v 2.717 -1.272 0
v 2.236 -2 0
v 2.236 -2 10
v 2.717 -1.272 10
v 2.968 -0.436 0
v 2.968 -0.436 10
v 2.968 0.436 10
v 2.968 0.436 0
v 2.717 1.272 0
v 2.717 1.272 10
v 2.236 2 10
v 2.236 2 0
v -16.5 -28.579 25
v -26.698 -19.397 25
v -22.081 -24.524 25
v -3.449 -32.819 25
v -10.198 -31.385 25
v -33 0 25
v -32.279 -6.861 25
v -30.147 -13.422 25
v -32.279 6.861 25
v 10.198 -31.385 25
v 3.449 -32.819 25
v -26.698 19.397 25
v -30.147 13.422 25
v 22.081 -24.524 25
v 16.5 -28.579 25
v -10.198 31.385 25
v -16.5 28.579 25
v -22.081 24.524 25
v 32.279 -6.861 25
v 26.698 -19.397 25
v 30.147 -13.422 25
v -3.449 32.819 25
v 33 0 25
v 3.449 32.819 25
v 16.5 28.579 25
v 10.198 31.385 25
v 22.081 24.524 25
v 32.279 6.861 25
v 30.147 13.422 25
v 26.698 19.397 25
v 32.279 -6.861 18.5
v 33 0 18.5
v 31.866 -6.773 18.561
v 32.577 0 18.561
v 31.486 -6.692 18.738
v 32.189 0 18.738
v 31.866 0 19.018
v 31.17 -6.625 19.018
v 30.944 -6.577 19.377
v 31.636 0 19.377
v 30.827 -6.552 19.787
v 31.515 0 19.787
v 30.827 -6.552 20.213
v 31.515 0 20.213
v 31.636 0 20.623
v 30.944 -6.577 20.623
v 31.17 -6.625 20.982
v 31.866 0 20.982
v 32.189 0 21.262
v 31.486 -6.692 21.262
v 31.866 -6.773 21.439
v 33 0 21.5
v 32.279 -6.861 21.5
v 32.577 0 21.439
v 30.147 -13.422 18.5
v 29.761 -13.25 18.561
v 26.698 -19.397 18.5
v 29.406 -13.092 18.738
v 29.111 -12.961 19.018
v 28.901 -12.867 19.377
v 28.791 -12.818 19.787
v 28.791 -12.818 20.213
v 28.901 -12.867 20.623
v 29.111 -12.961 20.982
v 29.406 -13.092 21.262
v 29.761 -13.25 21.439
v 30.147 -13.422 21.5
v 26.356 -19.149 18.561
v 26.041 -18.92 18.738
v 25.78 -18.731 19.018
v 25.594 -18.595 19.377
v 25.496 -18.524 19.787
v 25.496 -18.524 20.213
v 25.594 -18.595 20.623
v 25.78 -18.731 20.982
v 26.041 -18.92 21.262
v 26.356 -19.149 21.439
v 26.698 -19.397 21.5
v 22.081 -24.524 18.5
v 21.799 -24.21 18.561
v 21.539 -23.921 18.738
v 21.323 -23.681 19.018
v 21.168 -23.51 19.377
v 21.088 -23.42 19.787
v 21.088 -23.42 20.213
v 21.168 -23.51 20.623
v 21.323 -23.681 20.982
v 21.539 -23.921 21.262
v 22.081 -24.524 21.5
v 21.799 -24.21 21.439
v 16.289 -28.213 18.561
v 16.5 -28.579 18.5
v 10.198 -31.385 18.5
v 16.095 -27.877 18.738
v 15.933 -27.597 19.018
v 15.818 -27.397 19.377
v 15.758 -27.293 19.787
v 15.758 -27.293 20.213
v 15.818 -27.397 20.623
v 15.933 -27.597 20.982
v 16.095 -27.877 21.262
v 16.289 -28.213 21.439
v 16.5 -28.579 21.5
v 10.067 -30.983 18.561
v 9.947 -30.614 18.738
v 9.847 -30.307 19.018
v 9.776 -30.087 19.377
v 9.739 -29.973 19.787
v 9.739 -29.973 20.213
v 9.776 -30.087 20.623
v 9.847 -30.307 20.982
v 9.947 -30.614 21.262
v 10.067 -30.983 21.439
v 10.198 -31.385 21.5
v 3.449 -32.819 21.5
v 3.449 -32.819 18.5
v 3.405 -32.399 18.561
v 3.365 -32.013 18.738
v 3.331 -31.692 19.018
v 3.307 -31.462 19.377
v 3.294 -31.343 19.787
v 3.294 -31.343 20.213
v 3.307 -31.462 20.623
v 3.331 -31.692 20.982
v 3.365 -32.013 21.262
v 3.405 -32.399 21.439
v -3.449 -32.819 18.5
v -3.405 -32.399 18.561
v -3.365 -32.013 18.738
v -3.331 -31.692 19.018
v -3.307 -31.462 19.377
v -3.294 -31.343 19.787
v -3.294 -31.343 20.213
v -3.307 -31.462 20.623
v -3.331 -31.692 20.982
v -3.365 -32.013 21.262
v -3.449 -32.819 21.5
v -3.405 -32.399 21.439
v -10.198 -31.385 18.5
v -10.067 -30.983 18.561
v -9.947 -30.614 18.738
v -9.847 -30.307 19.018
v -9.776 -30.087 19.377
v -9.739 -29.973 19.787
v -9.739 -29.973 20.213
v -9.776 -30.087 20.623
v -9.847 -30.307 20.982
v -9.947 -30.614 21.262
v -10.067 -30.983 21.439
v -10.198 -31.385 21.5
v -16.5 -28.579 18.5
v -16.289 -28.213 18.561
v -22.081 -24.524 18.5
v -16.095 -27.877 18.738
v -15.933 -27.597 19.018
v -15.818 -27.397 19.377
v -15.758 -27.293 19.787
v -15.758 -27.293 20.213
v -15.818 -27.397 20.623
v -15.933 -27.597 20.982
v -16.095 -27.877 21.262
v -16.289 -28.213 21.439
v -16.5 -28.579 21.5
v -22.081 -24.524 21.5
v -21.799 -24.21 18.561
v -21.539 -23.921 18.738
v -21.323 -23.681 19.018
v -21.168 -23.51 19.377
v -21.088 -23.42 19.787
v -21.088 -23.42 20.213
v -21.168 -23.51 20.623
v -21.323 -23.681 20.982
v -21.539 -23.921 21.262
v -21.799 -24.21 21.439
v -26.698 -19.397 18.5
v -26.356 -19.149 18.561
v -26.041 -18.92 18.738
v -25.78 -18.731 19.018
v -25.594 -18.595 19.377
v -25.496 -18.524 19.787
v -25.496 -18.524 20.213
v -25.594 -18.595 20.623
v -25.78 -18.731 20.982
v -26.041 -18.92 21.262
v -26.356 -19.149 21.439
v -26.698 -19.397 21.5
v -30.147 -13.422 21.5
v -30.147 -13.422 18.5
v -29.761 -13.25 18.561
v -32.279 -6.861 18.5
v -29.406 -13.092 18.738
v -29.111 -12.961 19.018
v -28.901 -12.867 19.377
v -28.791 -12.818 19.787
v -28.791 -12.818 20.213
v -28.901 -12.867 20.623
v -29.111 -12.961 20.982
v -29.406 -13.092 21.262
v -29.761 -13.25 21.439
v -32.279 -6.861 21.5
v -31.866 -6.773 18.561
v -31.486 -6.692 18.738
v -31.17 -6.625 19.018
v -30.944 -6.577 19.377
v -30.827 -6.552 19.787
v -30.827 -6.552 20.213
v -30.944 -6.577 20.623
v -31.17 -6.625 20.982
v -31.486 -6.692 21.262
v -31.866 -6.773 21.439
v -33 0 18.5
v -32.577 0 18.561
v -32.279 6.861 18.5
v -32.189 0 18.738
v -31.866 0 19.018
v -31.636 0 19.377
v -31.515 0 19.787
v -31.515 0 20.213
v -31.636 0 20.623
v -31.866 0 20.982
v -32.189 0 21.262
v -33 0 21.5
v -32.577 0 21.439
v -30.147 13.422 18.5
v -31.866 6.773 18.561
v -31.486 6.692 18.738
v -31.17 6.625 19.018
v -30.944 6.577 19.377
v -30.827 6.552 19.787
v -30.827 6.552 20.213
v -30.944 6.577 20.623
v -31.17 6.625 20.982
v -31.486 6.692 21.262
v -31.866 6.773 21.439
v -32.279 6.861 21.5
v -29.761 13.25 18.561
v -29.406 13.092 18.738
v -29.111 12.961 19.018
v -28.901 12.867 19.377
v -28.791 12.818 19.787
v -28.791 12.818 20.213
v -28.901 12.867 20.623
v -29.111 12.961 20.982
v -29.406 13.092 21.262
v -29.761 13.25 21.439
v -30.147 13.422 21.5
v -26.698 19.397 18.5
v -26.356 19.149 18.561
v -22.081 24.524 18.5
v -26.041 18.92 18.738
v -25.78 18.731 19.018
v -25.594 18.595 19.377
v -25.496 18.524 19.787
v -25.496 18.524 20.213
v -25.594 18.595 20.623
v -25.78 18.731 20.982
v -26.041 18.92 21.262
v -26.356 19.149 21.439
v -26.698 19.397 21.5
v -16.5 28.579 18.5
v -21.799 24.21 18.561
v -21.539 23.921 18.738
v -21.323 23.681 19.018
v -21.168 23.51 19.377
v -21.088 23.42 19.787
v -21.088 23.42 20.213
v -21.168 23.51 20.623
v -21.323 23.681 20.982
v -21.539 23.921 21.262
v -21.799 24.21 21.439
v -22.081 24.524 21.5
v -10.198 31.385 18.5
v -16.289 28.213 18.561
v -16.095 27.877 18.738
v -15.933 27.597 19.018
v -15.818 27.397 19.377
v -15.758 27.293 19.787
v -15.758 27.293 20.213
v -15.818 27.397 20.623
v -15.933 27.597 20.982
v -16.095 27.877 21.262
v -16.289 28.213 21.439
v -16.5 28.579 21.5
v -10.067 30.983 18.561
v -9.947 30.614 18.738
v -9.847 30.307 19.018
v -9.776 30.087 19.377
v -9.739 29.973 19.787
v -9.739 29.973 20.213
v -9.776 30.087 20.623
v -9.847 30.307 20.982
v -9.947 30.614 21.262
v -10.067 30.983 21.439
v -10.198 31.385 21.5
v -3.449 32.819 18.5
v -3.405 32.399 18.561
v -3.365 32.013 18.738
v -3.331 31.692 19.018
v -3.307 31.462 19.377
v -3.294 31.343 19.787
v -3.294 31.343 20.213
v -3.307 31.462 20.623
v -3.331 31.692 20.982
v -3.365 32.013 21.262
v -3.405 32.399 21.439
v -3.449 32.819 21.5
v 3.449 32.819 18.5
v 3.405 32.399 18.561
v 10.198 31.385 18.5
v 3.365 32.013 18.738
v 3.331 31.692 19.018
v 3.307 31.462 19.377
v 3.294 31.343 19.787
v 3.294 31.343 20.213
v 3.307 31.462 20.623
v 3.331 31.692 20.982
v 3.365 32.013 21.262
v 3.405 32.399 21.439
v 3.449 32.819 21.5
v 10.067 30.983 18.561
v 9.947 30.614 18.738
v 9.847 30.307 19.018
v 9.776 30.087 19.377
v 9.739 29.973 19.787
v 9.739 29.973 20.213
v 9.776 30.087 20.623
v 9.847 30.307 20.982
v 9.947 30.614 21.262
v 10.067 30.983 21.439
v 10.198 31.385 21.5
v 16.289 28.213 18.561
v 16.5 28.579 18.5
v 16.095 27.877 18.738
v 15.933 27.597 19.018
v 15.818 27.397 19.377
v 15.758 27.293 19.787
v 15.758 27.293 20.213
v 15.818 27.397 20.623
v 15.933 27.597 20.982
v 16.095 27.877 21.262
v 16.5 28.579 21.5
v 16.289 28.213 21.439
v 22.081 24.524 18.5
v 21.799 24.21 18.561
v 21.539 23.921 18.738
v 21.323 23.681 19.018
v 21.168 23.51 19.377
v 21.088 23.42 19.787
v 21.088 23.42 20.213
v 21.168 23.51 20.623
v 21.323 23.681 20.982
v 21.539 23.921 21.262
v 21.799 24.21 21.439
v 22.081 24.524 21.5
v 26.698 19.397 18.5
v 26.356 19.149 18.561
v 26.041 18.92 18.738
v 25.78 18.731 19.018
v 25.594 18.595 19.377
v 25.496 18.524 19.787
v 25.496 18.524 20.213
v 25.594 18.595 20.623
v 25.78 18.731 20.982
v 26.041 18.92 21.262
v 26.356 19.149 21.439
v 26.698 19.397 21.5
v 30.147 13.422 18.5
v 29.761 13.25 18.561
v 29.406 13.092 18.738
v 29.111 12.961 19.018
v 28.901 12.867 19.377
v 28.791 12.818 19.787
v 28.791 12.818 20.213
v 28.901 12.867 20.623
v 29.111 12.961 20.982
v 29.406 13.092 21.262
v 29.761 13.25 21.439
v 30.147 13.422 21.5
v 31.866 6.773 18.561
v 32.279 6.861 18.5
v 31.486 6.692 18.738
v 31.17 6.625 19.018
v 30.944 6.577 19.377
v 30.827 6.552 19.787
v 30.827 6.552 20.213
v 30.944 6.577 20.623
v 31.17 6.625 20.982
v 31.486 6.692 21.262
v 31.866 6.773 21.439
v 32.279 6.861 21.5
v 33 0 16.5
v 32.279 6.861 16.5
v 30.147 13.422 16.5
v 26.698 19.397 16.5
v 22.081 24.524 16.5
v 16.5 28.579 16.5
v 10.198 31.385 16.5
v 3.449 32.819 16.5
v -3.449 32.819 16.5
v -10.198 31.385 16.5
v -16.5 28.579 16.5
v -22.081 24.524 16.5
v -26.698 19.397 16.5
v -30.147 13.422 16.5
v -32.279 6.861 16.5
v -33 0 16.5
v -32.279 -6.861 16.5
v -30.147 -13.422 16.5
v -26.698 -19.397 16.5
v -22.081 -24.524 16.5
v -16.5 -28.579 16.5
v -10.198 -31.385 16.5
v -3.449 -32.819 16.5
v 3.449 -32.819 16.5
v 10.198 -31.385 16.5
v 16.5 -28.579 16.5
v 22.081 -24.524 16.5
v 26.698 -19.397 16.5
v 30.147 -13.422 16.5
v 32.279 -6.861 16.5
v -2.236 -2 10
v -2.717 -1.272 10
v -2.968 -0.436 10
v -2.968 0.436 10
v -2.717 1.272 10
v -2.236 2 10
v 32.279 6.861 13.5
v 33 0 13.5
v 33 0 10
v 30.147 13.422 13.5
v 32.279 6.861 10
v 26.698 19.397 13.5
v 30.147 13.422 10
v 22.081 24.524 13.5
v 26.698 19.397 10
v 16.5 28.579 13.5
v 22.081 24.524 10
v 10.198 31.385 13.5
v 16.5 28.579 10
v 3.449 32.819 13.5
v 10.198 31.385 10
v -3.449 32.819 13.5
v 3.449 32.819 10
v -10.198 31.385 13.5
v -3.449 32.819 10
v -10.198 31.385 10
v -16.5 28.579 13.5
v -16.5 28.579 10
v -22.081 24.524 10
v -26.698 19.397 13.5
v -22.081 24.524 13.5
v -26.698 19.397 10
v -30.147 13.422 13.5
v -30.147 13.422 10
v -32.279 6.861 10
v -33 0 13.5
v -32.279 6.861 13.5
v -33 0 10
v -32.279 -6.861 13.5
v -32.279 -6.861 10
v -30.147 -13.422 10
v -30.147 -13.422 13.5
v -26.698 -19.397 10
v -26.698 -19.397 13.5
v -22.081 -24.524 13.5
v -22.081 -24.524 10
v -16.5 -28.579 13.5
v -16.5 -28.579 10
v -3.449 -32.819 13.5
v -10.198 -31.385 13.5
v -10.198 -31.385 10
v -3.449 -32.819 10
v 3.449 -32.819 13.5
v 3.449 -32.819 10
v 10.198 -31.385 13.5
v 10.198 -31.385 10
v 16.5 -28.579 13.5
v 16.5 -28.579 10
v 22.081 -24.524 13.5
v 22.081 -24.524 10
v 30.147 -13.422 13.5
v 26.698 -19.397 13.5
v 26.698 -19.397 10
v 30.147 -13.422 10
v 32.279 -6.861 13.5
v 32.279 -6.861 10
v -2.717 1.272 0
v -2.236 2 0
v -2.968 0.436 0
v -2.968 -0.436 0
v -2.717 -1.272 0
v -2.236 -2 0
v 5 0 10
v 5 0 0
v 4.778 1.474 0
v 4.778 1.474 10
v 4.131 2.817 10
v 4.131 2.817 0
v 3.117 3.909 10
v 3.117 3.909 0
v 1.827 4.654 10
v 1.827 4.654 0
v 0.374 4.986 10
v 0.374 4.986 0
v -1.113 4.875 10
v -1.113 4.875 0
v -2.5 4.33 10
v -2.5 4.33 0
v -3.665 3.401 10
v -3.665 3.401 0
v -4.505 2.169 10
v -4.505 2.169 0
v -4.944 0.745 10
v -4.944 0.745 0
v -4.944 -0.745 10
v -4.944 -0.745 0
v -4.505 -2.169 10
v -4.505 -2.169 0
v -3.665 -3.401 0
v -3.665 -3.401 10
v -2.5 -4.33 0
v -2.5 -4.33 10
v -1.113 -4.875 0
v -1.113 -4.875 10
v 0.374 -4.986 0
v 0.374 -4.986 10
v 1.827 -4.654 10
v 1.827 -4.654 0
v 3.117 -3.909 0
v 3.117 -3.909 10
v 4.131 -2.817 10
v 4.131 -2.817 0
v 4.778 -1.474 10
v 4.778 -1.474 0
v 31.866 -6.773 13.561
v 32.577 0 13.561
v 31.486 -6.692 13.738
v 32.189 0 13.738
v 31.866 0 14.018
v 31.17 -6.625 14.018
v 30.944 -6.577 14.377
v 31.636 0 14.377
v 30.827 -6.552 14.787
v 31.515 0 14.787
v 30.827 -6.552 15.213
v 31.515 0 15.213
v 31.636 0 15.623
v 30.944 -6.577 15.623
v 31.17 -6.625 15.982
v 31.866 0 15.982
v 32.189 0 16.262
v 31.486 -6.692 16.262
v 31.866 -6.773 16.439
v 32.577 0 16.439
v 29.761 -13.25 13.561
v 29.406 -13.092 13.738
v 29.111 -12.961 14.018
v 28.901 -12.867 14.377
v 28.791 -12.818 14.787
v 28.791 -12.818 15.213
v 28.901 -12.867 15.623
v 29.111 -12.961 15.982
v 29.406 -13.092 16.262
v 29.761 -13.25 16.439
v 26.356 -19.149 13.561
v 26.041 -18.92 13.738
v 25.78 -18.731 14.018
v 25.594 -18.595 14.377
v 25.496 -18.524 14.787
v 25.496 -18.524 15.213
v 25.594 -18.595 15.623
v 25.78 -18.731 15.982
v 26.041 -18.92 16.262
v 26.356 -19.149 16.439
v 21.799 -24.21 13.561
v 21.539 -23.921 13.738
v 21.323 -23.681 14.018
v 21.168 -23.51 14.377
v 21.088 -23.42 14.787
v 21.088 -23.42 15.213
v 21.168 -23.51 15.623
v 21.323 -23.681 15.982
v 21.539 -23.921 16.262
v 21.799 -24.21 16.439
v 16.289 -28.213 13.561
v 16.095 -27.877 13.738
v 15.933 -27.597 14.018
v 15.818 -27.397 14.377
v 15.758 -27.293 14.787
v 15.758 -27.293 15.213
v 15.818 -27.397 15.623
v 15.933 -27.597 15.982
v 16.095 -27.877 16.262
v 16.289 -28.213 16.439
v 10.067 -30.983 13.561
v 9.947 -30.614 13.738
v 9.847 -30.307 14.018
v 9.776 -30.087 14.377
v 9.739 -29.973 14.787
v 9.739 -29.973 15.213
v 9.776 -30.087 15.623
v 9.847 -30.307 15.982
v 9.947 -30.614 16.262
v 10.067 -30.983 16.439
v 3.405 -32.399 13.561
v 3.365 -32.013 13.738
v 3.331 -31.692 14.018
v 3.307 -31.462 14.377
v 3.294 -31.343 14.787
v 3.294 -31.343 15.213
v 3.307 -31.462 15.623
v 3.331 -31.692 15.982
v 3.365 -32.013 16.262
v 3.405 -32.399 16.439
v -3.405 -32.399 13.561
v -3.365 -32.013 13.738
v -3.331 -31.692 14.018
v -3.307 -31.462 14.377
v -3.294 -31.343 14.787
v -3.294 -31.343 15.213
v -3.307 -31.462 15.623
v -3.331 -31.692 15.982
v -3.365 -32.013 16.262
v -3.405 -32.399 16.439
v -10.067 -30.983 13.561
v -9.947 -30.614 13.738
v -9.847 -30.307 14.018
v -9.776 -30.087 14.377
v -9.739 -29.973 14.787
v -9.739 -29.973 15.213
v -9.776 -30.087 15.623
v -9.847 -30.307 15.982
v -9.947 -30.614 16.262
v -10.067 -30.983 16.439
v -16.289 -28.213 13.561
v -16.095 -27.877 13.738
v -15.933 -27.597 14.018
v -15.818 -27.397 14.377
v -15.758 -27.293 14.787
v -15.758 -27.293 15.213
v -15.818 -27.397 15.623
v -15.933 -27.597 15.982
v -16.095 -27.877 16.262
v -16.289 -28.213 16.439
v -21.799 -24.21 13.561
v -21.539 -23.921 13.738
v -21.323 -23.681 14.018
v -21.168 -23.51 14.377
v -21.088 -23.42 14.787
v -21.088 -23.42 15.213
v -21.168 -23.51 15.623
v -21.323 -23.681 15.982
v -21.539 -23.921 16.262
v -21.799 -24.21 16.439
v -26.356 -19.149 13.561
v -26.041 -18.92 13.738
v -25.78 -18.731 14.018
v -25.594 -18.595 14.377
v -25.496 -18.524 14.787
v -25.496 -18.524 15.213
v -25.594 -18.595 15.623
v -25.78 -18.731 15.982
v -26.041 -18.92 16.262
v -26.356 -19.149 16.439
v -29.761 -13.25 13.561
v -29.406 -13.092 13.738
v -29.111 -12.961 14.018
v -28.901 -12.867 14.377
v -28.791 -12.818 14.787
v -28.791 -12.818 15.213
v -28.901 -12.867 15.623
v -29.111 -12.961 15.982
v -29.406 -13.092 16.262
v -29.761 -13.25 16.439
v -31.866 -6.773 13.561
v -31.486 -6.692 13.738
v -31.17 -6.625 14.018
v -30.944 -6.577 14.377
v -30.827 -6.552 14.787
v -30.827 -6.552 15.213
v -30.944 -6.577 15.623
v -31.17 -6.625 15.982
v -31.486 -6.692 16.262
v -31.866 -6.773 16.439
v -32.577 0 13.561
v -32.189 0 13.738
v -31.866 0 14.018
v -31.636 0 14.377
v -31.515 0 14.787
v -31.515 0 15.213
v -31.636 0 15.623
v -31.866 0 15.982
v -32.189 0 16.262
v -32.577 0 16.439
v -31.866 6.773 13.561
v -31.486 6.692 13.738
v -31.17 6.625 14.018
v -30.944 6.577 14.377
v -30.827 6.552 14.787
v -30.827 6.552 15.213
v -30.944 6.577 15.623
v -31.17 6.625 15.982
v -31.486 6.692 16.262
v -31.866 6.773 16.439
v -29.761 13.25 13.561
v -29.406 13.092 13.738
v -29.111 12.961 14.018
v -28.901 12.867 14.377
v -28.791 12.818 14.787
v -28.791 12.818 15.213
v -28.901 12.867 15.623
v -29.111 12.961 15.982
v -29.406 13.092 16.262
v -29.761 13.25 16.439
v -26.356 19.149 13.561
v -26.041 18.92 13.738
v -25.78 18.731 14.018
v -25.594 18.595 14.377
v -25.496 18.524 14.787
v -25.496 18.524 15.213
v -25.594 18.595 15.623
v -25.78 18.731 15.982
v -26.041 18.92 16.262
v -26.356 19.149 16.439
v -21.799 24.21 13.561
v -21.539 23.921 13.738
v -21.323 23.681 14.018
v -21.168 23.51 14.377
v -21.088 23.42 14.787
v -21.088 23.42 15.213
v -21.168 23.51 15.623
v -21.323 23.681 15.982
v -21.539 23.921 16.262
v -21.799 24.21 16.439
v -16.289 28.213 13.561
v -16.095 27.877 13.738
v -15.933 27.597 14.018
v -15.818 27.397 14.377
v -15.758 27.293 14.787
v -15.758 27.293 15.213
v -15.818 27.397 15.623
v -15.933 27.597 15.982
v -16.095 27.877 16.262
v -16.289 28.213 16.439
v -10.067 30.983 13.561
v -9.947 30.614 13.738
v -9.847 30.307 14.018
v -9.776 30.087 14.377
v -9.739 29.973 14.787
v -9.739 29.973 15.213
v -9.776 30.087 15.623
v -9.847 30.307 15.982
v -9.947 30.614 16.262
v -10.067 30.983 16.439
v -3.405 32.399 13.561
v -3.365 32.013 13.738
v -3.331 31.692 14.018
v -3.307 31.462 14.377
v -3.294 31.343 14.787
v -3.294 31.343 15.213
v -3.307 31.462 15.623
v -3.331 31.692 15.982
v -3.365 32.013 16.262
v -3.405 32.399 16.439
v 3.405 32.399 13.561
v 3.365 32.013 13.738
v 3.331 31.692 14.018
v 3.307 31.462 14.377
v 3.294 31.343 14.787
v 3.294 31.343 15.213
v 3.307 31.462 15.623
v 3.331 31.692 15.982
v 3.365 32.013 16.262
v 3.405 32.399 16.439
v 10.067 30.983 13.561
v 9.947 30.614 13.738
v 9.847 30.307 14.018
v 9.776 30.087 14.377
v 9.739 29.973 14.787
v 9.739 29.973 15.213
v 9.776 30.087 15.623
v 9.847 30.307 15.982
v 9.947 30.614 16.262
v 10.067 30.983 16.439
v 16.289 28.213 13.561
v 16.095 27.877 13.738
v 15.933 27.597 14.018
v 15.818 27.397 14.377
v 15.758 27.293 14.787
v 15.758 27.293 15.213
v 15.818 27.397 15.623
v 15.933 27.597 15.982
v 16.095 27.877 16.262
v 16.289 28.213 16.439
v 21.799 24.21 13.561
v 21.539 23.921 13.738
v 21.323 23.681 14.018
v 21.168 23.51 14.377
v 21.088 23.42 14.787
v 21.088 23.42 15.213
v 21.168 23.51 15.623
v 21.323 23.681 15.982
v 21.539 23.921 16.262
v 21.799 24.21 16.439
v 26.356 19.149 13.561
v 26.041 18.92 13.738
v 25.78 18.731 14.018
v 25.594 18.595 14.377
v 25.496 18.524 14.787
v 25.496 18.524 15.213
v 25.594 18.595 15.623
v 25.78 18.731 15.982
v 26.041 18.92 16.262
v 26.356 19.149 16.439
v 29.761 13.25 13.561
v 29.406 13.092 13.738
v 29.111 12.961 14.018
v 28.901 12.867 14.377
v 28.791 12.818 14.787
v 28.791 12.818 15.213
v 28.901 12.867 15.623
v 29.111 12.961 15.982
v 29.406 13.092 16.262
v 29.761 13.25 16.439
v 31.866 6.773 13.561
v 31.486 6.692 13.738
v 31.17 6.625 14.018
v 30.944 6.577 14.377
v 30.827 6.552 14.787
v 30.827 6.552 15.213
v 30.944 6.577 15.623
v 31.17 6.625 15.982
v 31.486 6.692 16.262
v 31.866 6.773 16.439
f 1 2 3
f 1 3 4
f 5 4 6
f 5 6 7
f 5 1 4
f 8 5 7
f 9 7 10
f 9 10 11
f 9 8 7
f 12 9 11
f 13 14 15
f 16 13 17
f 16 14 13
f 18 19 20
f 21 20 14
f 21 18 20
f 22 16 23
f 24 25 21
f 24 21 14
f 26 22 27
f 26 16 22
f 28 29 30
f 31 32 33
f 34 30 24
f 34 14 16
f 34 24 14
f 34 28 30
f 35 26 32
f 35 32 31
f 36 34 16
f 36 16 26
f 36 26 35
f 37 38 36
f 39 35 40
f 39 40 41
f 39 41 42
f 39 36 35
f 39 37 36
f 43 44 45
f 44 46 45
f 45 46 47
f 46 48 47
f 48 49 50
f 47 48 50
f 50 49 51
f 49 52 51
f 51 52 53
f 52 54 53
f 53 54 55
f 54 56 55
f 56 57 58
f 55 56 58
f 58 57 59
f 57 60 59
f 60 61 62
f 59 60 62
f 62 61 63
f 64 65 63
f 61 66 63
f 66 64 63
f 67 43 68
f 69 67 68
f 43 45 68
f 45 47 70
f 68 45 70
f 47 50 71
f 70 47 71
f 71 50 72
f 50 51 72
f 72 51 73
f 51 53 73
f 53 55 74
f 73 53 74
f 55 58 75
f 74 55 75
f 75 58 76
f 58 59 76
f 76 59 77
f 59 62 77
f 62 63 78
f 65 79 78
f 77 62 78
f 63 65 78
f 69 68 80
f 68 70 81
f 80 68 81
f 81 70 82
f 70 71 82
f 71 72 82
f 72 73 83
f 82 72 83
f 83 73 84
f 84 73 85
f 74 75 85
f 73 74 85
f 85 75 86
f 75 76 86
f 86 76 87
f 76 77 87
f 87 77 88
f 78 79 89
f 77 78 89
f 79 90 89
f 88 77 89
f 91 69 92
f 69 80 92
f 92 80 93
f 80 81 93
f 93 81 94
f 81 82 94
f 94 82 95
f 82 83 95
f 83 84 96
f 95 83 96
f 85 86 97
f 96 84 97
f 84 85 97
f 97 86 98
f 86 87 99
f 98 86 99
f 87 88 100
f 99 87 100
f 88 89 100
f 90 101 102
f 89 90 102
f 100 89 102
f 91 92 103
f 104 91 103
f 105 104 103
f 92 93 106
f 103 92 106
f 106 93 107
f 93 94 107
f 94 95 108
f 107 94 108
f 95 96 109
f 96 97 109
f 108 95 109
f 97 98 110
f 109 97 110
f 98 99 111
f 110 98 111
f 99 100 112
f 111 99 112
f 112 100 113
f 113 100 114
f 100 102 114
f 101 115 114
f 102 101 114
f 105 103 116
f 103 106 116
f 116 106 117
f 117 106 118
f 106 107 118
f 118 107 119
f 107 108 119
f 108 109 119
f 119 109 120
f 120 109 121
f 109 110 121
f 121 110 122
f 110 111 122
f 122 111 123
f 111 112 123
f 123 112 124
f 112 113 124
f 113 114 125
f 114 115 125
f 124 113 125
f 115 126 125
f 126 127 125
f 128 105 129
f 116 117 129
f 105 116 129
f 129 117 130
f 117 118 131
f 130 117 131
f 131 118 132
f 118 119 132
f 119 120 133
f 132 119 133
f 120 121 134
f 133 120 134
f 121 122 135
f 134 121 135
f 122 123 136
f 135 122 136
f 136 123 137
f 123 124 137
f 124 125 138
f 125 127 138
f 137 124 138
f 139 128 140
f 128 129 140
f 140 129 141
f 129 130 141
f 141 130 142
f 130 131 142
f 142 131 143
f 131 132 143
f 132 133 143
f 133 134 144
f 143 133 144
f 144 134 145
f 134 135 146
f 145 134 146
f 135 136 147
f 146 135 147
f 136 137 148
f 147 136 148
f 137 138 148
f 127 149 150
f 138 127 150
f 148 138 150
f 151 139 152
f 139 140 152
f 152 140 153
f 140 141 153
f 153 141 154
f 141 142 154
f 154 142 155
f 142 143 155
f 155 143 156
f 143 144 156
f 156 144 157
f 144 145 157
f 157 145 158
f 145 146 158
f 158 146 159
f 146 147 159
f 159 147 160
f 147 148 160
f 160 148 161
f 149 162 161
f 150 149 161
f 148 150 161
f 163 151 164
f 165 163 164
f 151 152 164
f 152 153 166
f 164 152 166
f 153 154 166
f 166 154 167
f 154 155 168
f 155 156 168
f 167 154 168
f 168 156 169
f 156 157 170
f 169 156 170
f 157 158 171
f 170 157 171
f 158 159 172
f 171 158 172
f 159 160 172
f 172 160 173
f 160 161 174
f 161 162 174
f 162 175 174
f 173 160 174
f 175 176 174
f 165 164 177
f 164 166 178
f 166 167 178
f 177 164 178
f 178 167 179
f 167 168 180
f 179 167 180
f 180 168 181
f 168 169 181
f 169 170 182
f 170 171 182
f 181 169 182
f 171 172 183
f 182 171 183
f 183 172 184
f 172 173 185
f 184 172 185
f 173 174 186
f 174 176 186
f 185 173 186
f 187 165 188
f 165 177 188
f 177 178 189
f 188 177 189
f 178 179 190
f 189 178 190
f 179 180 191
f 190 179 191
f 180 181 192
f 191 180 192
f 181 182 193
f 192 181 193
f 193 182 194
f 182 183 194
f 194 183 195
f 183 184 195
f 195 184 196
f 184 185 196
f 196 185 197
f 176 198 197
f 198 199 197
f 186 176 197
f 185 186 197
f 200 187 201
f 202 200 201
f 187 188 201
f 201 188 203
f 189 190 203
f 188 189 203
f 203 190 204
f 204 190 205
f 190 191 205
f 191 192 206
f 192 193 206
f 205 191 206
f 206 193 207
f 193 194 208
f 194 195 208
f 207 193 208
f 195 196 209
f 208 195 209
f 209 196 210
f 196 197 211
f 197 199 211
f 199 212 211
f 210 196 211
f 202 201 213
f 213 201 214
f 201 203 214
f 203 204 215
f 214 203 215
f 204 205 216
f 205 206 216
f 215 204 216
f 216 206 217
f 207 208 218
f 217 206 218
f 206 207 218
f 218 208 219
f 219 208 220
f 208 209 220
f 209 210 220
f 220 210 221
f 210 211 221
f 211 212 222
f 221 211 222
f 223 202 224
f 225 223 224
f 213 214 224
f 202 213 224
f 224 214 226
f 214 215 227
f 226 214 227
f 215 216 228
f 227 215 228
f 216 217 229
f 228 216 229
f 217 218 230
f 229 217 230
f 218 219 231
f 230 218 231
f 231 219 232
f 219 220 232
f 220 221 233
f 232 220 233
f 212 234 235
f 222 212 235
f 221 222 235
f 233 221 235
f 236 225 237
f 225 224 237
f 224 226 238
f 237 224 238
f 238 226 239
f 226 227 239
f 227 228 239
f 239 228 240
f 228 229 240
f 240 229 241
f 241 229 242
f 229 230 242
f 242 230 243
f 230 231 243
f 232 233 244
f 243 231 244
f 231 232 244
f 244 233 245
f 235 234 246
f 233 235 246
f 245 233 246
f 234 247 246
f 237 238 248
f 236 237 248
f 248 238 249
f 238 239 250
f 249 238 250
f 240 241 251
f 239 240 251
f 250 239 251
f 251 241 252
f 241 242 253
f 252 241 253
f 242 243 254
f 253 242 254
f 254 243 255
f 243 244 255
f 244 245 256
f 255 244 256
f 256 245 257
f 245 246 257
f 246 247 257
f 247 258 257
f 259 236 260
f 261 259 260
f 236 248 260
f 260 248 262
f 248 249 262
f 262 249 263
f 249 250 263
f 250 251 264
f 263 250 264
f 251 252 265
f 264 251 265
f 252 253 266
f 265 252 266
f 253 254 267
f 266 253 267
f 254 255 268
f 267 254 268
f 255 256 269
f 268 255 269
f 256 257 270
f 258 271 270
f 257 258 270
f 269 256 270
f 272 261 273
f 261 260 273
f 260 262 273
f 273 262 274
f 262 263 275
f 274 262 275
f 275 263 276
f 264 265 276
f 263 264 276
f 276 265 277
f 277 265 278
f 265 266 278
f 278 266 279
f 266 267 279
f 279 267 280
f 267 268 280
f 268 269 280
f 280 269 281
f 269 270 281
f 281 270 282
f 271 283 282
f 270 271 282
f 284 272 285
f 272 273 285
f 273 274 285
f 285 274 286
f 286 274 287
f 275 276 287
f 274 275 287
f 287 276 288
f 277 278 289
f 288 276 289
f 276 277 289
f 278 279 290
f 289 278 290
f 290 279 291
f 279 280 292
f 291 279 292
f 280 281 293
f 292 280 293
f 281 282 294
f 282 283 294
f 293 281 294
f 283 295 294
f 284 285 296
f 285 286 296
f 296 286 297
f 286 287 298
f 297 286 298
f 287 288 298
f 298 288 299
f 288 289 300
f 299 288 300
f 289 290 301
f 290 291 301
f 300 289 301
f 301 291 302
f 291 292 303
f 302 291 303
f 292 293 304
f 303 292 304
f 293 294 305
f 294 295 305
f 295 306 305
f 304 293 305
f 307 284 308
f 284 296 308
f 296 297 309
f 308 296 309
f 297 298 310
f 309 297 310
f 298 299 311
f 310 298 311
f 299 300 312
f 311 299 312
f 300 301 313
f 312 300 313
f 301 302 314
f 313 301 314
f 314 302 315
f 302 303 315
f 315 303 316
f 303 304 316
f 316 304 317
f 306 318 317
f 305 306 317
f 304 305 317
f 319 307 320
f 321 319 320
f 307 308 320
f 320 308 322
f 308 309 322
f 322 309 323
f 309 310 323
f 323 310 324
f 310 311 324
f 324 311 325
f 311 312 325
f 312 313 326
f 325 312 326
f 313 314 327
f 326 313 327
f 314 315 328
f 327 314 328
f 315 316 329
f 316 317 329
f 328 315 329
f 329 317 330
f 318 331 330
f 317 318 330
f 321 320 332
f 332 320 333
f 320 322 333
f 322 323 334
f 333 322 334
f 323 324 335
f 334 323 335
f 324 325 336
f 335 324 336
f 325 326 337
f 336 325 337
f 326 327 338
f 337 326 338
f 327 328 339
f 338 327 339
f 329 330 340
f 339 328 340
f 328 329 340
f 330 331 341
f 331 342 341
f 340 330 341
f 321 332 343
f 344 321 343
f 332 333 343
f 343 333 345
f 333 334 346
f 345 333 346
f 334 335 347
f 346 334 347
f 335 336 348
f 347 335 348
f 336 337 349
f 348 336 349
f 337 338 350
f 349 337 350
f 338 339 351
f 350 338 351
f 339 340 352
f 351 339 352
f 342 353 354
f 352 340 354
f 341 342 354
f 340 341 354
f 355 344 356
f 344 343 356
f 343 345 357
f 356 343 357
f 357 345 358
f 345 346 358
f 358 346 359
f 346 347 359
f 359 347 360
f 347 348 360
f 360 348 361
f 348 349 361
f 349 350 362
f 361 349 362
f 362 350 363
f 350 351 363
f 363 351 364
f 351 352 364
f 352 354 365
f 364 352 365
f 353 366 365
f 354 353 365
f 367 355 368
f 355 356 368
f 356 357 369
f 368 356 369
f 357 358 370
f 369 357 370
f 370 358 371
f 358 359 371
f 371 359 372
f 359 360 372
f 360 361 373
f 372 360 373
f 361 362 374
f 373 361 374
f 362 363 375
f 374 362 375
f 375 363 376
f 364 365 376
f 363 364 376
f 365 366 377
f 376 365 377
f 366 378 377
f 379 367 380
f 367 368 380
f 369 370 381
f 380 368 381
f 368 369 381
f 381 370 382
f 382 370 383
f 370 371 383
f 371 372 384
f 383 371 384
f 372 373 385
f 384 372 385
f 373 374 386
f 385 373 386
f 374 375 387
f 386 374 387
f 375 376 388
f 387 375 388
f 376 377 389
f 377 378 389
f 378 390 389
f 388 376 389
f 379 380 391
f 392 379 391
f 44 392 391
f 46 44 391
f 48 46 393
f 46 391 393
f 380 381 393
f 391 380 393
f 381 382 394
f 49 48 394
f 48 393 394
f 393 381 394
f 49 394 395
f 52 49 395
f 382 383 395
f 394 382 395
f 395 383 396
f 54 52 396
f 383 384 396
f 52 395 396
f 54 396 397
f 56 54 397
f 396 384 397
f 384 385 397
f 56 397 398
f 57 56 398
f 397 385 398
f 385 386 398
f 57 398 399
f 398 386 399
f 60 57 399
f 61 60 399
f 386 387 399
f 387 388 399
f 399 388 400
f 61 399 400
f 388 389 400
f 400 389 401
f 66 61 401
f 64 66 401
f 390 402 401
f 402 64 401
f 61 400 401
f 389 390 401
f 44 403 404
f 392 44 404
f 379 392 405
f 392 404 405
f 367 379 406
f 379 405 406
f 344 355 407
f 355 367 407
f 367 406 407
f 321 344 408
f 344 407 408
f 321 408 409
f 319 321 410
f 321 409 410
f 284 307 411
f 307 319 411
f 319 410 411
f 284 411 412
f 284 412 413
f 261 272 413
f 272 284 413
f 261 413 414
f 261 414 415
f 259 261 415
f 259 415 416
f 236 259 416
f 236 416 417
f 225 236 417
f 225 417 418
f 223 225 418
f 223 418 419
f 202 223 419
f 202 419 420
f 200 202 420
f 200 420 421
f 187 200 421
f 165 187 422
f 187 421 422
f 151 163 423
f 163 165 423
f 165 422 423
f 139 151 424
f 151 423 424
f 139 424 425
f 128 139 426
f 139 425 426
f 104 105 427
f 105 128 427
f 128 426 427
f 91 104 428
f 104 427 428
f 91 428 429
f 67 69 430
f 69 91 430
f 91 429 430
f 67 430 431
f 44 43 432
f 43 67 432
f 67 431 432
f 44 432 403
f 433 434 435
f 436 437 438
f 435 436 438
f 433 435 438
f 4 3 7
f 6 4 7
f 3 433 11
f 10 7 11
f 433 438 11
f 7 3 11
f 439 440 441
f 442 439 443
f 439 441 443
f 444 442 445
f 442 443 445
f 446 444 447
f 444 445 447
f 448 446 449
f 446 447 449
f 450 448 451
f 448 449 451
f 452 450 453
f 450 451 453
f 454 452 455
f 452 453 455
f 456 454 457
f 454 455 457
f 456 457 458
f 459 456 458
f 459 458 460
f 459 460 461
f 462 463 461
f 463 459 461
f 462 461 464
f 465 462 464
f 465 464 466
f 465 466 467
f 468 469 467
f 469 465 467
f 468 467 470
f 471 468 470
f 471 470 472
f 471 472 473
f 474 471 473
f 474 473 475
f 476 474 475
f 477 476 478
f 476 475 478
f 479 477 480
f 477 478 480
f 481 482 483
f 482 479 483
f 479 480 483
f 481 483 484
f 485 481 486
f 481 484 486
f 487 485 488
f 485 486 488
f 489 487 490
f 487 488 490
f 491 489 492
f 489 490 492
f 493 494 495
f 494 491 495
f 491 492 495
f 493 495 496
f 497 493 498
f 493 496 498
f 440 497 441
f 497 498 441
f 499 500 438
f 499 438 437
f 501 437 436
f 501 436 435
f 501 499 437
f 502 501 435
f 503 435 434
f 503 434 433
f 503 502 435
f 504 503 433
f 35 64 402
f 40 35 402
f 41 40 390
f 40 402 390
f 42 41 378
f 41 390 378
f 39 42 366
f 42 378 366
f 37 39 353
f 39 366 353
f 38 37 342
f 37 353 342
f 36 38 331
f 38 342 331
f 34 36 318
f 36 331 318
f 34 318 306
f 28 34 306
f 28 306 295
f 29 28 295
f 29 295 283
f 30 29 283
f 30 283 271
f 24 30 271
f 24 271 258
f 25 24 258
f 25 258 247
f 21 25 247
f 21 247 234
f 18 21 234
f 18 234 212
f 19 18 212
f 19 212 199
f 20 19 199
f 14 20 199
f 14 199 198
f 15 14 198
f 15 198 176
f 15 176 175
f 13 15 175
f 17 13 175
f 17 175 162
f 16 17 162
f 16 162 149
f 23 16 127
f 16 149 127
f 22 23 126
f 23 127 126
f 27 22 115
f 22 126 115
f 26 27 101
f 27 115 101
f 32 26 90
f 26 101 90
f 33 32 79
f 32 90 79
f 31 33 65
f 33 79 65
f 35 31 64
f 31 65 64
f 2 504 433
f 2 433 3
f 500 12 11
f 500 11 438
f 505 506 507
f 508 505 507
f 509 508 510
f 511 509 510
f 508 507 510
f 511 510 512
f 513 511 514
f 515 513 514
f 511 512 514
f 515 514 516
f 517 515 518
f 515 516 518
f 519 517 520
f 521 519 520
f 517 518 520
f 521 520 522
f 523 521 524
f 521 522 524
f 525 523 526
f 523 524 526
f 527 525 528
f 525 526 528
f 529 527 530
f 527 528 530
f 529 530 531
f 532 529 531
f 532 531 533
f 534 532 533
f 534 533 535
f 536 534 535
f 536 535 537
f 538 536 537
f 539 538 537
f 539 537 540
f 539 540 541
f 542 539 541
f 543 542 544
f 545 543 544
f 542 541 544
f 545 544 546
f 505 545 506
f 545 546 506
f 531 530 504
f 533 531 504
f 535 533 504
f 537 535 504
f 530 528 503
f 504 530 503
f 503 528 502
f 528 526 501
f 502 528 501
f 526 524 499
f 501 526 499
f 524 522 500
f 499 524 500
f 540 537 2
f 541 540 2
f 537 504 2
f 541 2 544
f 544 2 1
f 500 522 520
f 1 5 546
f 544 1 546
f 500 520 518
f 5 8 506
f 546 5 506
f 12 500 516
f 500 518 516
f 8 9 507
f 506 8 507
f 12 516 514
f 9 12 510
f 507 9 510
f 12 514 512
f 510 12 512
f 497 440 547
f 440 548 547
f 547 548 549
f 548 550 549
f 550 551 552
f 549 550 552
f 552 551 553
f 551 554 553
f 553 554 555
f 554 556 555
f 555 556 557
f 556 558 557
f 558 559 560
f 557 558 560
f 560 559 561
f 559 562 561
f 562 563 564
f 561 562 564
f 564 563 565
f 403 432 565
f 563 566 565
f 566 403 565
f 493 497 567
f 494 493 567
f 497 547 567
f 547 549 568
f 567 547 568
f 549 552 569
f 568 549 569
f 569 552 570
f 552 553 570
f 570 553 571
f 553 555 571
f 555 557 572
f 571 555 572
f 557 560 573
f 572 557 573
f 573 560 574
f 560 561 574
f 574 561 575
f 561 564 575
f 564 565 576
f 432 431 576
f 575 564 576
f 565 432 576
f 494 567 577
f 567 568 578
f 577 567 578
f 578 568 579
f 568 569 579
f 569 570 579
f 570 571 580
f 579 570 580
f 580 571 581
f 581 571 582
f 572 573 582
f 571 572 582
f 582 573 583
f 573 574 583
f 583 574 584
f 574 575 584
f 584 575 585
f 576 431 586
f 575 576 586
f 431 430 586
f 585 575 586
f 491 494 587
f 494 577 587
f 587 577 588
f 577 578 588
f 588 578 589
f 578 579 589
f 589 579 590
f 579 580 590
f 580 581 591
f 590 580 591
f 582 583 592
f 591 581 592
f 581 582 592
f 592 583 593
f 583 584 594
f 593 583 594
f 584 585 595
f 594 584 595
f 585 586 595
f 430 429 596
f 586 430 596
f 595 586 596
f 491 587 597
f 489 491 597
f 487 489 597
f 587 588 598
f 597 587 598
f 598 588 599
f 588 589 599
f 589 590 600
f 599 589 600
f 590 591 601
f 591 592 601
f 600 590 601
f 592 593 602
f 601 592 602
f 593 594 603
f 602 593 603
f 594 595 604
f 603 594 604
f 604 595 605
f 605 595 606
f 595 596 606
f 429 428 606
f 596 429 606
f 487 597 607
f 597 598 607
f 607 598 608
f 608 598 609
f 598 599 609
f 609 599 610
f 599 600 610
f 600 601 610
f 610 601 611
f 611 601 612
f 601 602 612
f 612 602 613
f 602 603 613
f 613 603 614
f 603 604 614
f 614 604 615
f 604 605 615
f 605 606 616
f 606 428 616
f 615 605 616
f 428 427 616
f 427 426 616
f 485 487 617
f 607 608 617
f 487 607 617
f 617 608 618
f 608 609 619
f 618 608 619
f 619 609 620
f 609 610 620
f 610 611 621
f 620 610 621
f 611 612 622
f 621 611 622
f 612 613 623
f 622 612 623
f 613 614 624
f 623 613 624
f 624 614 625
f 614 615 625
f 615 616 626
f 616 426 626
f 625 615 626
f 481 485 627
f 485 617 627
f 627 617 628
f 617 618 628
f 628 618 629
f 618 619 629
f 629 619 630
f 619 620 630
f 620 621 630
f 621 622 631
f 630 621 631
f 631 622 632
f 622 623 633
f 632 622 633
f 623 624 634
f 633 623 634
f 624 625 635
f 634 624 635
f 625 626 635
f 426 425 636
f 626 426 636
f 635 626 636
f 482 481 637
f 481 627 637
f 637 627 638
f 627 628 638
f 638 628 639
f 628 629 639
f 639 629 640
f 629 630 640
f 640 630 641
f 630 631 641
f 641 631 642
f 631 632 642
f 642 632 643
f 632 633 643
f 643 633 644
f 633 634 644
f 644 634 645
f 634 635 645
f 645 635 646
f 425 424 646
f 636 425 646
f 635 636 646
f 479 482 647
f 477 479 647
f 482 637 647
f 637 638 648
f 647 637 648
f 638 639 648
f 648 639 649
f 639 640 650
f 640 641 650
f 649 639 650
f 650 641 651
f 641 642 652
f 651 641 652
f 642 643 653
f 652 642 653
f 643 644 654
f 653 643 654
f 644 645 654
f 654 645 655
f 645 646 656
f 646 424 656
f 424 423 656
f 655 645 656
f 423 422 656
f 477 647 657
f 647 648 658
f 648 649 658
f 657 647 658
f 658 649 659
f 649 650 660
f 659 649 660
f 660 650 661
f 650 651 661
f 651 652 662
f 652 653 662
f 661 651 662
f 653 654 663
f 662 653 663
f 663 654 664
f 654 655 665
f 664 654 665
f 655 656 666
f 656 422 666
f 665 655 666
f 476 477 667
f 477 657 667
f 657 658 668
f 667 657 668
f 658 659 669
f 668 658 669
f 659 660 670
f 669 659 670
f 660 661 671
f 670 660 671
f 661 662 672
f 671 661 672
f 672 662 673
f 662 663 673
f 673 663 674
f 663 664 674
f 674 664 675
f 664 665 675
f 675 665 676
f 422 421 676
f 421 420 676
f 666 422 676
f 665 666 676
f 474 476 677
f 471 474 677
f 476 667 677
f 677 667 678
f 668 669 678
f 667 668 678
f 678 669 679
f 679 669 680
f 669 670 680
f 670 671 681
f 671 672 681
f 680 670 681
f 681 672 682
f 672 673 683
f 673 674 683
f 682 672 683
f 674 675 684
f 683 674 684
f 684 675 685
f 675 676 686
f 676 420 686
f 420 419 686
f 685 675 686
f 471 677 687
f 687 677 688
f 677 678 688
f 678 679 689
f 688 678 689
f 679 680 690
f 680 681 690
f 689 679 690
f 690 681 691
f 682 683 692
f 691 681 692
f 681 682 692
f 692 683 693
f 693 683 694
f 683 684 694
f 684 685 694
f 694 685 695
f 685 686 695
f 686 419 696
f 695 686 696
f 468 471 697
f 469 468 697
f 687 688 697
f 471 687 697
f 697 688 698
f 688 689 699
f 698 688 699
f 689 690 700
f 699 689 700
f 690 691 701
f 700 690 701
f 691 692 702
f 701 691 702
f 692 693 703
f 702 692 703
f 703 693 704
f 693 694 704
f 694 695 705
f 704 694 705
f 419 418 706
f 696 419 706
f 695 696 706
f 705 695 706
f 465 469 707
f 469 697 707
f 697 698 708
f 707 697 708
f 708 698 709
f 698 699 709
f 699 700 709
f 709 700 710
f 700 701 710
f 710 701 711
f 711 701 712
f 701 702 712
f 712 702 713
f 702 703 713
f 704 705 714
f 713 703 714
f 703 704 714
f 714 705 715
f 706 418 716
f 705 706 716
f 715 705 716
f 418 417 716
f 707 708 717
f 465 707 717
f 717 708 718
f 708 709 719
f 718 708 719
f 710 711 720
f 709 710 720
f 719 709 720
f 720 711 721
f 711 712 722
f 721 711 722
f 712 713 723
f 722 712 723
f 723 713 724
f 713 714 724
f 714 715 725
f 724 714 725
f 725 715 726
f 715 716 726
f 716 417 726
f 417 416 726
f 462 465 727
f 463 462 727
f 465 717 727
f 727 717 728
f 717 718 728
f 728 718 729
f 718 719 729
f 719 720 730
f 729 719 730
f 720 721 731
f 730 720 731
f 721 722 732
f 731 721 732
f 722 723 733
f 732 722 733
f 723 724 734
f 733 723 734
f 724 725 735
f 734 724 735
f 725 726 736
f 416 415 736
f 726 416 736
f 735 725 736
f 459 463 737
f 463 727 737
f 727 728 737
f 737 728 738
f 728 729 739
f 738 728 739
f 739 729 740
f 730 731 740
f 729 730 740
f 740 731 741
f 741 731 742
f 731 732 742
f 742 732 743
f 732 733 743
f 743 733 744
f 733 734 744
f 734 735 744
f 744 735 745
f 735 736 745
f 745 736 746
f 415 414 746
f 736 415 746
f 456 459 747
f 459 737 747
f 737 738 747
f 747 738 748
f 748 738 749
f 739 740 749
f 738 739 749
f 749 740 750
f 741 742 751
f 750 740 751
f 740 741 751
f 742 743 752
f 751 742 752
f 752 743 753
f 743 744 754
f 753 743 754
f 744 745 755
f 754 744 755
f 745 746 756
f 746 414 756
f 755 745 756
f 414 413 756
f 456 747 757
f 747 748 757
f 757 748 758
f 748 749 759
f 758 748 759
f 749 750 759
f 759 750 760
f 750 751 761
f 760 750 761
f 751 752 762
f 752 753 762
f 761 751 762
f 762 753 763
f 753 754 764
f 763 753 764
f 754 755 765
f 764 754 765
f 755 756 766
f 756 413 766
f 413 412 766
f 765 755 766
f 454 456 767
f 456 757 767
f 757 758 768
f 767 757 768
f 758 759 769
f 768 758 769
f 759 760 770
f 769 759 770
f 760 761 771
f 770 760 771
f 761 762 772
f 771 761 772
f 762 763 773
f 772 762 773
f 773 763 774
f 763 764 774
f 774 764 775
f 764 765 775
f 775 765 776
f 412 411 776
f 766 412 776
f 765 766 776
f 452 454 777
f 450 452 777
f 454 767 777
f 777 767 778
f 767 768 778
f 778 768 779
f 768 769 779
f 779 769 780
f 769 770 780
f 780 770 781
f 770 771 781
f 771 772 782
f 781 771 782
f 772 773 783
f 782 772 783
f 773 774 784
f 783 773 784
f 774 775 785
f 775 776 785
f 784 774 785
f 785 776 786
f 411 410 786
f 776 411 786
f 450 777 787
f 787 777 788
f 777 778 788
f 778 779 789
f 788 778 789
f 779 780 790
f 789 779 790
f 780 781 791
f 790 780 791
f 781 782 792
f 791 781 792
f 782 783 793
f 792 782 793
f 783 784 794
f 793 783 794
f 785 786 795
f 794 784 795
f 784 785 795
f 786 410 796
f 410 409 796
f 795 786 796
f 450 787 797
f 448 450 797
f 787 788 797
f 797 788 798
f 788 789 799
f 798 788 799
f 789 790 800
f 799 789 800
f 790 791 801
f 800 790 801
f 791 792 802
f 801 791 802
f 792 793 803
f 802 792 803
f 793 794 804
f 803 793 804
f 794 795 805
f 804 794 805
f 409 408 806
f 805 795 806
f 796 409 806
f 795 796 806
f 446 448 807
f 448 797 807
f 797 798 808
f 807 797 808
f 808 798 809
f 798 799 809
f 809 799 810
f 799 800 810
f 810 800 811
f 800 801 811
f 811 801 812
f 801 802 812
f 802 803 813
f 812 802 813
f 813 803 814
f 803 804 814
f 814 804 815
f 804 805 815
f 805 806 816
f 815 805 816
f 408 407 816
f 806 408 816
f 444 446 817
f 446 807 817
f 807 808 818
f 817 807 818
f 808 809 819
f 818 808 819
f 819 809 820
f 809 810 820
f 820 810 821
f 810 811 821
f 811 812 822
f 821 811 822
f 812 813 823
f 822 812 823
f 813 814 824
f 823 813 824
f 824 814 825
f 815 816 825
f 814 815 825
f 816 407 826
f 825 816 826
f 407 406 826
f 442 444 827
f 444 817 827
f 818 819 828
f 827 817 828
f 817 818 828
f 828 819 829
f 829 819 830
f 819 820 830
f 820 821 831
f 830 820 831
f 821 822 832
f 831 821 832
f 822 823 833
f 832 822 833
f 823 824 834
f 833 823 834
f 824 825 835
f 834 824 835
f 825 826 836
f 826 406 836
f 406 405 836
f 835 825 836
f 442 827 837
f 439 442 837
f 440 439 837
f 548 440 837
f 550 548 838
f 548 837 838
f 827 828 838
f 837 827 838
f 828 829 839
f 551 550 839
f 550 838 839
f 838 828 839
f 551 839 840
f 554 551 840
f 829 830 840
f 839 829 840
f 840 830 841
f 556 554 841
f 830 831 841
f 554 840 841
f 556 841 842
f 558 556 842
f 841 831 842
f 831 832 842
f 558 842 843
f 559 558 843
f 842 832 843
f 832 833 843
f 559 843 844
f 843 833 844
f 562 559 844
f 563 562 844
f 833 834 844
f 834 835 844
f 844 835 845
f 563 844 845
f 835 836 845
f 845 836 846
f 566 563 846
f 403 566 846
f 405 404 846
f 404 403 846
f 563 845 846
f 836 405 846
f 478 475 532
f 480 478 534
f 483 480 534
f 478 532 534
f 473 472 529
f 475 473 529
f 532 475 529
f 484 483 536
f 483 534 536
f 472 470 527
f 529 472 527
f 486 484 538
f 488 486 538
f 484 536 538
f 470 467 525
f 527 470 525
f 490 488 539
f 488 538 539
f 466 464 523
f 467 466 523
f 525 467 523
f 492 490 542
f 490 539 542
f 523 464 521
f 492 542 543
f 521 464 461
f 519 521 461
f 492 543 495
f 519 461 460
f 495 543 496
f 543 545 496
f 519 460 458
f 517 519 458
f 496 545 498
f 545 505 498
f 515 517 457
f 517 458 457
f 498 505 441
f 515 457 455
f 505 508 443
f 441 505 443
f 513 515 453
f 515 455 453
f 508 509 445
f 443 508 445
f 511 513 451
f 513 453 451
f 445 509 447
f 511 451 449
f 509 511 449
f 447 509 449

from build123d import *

# Parameters (mm, degrees)
CROQUIS1_R              = 5
SALIENTE_EXTRUIR1_DEPTH = 10
CROQUIS2_R              = 33
SALIENTE_EXTRUIR2_DEPTH = 15
CROQUIS3_R              = 1.5


with BuildPart() as part:
    # Croquis1 → Saliente-Extruir1 (new body)
    with BuildSketch(Plane.XY):
        Circle(CROQUIS1_R)
        with BuildLine():
            Line((-2.236067977, -2), (2.236067977, -2))
            ThreePointArc((2.236067977, -2), (3, 0), (2.236067977, 2))
            Line((2.236067977, 2), (-2.236067977, 2))
            ThreePointArc((-2.236067977, 2), (-3, 0), (-2.236067977, -2))
        make_face(mode=Mode.SUBTRACT)
    extrude(amount=SALIENTE_EXTRUIR1_DEPTH)

    # Croquis2 → Saliente-Extruir2 (add)
    with BuildSketch(Plane.XY.offset(10)):
        Circle(CROQUIS2_R)
    extrude(amount=SALIENTE_EXTRUIR2_DEPTH)

    # Croquis3 → Cortar-Revolución1 (revolve, cut)
    with BuildSketch(Plane(origin=(0, 0, 0), x_dir=(1, 0, 0), z_dir=(0, 1, 0))):
        with Locations((33, -15)):
            Circle(CROQUIS3_R)
        with Locations((33, -20)):
            Circle(CROQUIS3_R)
    revolve(axis=Axis((0, 0, 24.978866337), (0, 0, -1)), mode=Mode.SUBTRACT)


solid = part.part
